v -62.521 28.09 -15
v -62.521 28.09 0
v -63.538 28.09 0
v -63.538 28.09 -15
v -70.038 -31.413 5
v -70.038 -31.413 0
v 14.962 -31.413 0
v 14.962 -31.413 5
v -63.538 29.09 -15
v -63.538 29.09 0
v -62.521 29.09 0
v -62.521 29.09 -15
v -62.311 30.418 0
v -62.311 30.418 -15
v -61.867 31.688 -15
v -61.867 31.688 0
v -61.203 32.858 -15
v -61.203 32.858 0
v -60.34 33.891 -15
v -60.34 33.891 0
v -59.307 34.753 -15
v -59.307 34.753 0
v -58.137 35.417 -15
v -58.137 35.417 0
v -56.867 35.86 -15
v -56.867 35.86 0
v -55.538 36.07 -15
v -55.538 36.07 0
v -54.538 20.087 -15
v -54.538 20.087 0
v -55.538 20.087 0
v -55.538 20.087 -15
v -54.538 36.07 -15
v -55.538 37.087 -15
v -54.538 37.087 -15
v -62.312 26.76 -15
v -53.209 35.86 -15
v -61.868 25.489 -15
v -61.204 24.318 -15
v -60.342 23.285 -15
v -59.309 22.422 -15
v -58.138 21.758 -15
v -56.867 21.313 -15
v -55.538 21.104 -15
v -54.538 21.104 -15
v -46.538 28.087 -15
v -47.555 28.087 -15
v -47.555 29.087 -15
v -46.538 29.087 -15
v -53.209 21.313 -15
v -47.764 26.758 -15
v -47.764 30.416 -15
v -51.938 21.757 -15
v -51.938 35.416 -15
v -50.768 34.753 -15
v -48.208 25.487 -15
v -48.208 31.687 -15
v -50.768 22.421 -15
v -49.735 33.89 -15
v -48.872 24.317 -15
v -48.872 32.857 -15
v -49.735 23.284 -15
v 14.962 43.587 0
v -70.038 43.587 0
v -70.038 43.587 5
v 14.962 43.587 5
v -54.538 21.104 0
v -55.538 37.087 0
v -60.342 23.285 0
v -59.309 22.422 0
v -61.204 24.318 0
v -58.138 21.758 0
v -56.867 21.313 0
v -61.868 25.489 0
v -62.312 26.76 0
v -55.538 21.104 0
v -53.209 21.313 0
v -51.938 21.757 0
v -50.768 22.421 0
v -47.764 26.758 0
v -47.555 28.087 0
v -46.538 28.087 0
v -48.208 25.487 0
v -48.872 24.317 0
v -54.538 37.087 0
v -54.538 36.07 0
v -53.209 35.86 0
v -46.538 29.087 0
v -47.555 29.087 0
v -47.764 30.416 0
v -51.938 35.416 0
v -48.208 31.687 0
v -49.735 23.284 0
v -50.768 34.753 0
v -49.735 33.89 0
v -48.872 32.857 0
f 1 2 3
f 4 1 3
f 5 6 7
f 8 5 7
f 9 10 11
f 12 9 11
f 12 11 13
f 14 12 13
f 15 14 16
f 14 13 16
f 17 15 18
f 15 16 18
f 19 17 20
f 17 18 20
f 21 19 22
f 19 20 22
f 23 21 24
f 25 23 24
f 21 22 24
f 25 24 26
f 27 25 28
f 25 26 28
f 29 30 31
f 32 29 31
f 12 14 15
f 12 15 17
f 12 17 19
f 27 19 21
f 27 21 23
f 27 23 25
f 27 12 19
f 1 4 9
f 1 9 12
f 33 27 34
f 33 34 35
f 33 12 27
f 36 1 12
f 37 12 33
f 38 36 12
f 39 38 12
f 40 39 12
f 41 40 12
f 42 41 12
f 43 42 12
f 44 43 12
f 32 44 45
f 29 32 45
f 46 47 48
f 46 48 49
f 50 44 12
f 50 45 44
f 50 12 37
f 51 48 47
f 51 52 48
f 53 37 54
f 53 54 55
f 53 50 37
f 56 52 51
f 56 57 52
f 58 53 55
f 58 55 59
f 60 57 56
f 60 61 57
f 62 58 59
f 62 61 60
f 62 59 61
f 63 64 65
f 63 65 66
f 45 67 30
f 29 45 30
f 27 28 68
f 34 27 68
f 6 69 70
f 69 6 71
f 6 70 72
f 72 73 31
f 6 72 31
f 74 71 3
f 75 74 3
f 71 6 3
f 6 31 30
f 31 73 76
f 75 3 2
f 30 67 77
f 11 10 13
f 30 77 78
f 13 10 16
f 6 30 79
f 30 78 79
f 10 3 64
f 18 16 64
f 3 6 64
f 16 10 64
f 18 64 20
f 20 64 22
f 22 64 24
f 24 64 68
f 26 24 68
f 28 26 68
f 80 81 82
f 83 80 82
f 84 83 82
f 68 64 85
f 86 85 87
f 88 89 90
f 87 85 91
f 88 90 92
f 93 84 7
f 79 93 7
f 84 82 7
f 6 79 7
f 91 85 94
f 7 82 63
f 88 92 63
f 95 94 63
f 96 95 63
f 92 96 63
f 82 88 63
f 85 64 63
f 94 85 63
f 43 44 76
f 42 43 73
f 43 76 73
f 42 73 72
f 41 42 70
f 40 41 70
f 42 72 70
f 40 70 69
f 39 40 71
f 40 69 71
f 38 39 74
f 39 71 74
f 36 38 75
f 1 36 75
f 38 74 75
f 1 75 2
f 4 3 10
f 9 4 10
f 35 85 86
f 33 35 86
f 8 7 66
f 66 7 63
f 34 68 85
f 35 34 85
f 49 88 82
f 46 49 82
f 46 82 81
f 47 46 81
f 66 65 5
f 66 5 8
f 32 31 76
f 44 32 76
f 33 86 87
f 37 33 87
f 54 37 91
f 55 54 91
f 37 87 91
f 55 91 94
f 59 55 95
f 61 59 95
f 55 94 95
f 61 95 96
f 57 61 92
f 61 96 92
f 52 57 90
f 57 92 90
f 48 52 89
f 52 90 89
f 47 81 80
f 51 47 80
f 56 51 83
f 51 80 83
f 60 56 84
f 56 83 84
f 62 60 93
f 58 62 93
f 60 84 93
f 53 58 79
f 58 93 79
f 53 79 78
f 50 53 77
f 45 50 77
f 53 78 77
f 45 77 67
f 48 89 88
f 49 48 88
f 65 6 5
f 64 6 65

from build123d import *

# Parameters (mm, degrees)
F0_W     = 85
F0_H     = 75
F1_DEPTH = 5
F3_DEPTH = 15


with BuildPart() as f1:
    # F0 (on Top) → F1 (new body)
    with BuildSketch(Plane.XY):
        with Locations((-27.537888, 6.086919)):
            Rectangle(F0_W, F0_H)
    extrude(amount=F1_DEPTH)

    # F2 (on face) → F3 (join)
    with BuildSketch(Plane(origin=(0, 0, 0), x_dir=(1, 0, 0), z_dir=(0, 0, -1))):
        with BuildLine():
            ThreePointArc((-47.554573, -29.086919), (-47.542061, -28.837059), (-47.537888, -28.586919))
            ThreePointArc((-47.537888, -28.586919), (-47.542061, -28.33678), (-47.554573, -28.086919))
            ThreePointArc((-47.554573, -28.086919), (-49.734587, -23.283619), (-54.537888, -21.103605))
            ThreePointArc((-54.537888, -21.103605), (-55.037888, -21.086919), (-55.537888, -21.103605))
            ThreePointArc((-55.537888, -21.103605), (-60.342111, -23.284541), (-62.521376, -28.089523))
            ThreePointArc((-62.521376, -28.089523), (-62.537888, -28.589529), (-62.521028, -29.089523))
            ThreePointArc((-62.521028, -29.089523), (-60.340266, -33.891143), (-55.537888, -36.070234))
            ThreePointArc((-55.537888, -36.070234), (-55.037888, -36.086919), (-54.537888, -36.070234))
            ThreePointArc((-54.537888, -36.070234), (-49.734587, -33.89022), (-47.554573, -29.086919))
        make_face()
        with BuildLine():
            ThreePointArc((-62.521028, -29.089523), (-62.537888, -28.589529), (-62.521376, -28.089523))
            Line((-62.521376, -28.089523), (-63.537888, -28.089523))
            Line((-63.537888, -28.089523), (-63.537888, -29.089523))
            Line((-63.537888, -29.089523), (-62.521028, -29.089523))
        make_face()
        with BuildLine():
            ThreePointArc((-47.554573, -28.086919), (-47.542061, -28.33678), (-47.537888, -28.586919))
            ThreePointArc((-47.537888, -28.586919), (-47.542061, -28.837059), (-47.554573, -29.086919))
            Line((-47.554573, -29.086919), (-46.537888, -29.086919))
            Line((-46.537888, -29.086919), (-46.537888, -28.086919))
            Line((-46.537888, -28.086919), (-47.554573, -28.086919))
        make_face()
        with BuildLine():
            ThreePointArc((-55.537888, -21.103605), (-55.037888, -21.086919), (-54.537888, -21.103605))
            Line((-54.537888, -21.103605), (-54.537888, -20.086919))
            Line((-54.537888, -20.086919), (-55.537888, -20.086919))
            Line((-55.537888, -20.086919), (-55.537888, -21.103605))
        make_face()
        with BuildLine():
            Line((-54.537888, -37.086919), (-54.537888, -36.070234))
            ThreePointArc((-54.537888, -36.070234), (-55.037888, -36.086919), (-55.537888, -36.070234))
            Line((-55.537888, -36.070234), (-55.537888, -37.086919))
            Line((-55.537888, -37.086919), (-54.537888, -37.086919))
        make_face()
    extrude(amount=F3_DEPTH)


solid = f1.part
